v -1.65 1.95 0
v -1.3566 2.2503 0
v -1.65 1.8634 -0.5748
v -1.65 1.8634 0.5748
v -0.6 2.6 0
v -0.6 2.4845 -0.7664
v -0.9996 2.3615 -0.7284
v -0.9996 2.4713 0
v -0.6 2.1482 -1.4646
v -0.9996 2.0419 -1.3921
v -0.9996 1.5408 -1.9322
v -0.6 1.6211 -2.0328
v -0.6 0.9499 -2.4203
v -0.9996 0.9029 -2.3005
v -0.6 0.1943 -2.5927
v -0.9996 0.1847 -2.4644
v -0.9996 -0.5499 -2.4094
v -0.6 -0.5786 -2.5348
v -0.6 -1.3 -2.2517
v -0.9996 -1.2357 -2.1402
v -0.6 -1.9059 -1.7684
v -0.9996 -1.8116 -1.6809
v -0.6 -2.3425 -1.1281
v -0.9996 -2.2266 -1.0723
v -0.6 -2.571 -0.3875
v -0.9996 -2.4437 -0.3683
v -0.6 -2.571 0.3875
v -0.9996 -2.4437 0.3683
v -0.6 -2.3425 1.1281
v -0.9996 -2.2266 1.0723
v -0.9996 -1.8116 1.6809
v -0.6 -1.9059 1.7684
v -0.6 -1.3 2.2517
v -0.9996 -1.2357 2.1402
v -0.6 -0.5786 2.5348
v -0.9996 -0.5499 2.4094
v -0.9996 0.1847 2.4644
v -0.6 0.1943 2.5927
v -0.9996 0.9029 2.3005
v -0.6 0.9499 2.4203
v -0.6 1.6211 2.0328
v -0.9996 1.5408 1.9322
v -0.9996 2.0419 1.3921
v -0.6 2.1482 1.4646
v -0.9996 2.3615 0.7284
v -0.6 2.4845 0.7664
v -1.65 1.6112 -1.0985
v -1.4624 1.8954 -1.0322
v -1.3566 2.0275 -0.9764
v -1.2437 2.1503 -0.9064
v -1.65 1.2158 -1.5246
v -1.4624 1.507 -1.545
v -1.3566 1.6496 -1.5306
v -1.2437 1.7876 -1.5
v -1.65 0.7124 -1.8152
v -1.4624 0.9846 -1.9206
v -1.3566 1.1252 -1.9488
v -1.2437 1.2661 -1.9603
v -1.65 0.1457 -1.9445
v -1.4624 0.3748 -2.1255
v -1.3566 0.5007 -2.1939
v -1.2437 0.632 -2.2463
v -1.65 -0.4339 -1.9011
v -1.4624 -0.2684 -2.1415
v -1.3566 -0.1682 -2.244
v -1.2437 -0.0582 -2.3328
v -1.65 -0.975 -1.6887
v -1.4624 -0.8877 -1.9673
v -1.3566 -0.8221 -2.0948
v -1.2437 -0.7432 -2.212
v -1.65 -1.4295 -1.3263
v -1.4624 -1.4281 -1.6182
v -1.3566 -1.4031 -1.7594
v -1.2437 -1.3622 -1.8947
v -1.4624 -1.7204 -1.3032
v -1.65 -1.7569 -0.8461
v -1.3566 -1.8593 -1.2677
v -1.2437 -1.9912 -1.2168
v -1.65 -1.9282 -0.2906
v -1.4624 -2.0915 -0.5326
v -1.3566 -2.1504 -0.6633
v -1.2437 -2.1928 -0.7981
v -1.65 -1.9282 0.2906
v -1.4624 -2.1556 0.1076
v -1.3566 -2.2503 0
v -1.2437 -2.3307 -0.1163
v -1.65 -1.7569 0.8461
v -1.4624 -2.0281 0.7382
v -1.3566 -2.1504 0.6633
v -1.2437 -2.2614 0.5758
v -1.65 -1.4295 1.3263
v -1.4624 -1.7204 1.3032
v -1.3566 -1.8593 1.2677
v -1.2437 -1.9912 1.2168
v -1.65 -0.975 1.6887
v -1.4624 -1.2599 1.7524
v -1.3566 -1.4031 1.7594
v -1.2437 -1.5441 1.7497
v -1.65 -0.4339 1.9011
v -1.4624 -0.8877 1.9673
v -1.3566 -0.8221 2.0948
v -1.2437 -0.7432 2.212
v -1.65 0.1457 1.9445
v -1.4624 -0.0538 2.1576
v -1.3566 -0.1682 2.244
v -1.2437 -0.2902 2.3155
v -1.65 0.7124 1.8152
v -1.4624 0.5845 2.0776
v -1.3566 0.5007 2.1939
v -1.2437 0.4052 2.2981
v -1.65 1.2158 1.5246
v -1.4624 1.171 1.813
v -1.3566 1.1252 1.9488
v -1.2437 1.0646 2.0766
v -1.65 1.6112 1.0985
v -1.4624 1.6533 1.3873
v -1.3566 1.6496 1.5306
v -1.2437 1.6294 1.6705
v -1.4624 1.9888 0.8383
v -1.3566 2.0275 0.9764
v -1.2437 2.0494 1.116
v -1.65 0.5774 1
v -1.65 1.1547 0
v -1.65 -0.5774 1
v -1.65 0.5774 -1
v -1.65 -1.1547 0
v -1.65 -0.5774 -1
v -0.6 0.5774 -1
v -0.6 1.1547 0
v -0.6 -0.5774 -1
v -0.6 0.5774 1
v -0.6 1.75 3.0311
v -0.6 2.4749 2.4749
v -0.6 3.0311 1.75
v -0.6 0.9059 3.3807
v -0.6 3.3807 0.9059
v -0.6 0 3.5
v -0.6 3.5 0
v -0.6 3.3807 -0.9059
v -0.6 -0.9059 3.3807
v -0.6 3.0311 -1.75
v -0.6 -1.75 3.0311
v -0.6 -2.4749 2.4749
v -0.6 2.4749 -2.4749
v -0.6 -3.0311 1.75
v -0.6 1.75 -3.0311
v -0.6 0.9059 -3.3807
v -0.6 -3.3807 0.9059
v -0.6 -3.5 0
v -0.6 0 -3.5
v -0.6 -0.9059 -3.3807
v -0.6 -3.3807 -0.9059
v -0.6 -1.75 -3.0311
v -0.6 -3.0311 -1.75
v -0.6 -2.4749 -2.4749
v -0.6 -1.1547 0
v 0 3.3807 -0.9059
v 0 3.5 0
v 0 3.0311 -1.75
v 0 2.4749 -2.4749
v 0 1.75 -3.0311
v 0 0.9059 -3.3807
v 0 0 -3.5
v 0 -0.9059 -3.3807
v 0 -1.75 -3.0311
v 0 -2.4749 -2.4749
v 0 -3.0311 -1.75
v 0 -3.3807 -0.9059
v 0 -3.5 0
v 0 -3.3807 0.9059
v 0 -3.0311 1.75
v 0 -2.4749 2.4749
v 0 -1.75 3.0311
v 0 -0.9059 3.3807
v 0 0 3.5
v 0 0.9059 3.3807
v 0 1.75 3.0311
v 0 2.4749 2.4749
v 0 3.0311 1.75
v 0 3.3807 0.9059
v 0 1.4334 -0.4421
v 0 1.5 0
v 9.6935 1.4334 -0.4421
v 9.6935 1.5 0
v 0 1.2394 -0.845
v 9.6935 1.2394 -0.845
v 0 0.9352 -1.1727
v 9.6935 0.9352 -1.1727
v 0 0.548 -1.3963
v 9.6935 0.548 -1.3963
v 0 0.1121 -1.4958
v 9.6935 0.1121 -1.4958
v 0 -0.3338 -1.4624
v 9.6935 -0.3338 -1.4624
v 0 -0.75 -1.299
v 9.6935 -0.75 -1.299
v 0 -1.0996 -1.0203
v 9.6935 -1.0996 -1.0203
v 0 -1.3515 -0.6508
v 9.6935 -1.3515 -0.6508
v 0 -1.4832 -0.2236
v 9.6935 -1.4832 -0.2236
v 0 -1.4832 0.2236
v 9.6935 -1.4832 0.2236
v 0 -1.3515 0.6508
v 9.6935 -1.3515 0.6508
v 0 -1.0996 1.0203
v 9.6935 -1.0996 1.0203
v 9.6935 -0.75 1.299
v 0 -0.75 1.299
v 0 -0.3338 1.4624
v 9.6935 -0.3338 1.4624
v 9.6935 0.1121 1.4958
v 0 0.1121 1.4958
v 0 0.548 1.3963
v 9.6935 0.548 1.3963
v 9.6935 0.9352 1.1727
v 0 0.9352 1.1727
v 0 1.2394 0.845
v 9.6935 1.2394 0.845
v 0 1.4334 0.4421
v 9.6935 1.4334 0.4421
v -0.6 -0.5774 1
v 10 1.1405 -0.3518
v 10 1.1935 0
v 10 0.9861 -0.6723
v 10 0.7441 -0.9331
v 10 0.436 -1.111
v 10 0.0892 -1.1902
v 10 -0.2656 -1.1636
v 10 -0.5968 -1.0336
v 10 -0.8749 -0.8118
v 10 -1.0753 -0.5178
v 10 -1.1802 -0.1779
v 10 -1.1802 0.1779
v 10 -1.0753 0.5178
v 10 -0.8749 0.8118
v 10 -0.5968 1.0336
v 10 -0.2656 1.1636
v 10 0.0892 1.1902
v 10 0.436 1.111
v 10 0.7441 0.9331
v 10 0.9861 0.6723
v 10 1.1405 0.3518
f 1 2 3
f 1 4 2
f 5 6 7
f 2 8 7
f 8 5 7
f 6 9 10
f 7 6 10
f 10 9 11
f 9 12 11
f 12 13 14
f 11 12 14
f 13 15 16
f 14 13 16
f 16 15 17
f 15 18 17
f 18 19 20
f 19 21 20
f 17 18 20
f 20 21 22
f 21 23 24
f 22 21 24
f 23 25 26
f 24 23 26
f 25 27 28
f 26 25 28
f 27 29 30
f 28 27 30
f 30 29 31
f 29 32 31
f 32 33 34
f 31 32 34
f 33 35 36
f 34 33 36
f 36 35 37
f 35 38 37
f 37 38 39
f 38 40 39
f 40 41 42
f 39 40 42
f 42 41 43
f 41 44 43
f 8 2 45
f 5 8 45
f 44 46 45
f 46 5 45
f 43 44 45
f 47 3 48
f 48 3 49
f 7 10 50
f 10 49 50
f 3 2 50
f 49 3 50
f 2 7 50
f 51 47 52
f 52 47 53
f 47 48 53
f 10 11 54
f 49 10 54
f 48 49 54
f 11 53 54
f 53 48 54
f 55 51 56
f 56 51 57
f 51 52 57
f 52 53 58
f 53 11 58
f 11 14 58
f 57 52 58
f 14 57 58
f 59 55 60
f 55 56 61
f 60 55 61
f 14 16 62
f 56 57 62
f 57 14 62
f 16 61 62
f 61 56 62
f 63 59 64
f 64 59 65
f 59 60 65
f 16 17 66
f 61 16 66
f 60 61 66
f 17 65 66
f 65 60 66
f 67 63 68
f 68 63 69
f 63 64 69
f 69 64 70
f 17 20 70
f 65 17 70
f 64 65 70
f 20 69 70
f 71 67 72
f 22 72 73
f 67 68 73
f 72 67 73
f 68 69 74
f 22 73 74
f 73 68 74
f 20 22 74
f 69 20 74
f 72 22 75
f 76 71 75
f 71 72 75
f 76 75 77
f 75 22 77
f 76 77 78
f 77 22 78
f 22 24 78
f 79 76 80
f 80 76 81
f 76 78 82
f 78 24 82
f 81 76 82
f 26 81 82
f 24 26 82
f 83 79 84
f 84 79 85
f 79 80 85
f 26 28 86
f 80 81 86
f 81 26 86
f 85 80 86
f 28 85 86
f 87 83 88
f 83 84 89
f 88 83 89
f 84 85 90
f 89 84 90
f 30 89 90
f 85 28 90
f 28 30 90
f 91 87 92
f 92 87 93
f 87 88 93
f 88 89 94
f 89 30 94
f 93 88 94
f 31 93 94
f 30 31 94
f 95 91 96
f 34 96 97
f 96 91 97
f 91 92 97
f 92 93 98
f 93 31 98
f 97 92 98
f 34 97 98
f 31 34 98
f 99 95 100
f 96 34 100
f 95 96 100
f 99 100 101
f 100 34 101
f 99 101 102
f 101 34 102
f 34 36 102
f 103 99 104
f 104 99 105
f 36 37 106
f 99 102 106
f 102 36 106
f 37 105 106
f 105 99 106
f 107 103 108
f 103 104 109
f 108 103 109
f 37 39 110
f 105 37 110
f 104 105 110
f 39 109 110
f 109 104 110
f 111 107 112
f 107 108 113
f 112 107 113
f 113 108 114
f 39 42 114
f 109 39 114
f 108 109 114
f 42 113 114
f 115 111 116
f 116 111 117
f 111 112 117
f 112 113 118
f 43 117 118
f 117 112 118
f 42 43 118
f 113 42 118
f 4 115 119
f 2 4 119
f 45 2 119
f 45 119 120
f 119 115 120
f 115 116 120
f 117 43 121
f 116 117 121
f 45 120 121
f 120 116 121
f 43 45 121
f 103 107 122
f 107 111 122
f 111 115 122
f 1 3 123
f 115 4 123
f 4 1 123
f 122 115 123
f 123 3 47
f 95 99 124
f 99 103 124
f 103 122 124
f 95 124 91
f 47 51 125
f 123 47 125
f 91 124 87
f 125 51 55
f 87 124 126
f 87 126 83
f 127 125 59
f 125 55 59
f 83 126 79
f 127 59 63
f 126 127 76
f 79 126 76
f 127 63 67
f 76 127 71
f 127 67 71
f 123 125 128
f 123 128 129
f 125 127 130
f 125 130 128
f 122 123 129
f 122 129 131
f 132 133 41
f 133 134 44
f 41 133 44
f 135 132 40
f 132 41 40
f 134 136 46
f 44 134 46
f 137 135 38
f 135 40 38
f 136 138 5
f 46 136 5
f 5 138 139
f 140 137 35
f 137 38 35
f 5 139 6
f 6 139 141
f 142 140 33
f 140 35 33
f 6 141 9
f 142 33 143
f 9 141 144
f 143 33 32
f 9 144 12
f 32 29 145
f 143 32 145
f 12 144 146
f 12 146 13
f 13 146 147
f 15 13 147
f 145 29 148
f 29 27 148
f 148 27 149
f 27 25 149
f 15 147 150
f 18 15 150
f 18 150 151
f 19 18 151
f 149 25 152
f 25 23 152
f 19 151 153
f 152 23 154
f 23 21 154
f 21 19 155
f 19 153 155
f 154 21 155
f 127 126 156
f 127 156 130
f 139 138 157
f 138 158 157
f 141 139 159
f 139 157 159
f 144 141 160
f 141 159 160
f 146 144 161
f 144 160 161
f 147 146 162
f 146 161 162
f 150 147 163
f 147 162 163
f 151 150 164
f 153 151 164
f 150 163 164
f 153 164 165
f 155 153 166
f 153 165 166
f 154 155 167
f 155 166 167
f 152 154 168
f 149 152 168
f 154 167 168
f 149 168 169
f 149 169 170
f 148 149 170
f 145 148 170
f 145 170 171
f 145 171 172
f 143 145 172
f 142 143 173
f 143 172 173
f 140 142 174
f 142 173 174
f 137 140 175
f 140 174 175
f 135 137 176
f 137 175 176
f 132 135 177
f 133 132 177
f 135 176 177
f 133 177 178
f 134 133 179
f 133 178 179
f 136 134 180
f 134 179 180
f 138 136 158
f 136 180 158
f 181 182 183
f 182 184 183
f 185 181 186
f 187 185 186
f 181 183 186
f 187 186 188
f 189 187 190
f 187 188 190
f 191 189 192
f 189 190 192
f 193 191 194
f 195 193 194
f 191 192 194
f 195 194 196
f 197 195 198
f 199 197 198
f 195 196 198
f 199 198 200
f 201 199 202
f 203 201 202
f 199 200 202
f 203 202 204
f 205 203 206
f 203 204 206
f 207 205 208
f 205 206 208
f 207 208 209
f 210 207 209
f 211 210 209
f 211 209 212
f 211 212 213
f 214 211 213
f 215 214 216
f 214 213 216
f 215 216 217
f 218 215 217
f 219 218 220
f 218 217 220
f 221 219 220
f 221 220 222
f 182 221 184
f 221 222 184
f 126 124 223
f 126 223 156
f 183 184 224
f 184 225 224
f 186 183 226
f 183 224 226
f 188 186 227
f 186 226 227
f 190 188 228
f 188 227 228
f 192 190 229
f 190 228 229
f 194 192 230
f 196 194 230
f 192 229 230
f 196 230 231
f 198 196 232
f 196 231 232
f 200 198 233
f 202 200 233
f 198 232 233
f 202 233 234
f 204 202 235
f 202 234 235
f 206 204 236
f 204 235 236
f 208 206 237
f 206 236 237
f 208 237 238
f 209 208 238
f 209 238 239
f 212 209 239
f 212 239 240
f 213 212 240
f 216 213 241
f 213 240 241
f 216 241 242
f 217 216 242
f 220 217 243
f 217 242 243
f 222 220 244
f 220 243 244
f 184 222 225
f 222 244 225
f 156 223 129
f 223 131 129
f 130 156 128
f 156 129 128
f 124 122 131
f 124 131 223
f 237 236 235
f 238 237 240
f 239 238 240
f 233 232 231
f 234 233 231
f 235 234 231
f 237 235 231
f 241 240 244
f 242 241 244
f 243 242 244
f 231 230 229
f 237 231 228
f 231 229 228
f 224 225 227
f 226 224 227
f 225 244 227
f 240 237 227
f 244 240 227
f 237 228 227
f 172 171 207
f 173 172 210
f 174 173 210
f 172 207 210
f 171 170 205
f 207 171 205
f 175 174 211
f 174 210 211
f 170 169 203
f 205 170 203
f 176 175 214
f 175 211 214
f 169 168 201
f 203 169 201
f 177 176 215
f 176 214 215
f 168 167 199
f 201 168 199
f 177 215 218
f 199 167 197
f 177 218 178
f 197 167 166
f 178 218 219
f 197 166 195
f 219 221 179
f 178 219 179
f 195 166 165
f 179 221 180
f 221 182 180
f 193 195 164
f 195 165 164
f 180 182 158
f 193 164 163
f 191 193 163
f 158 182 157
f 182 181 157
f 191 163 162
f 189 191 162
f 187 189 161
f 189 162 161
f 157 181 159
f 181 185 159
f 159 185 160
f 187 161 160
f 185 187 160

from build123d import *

# Parameters (mm, degrees)
CUT_EXTRUDE1_DEPTH = 1.05


with BuildPart() as part:
    # Sketch1 → Revolve1 (revolve)
    with BuildSketch(Plane.XY):
        with BuildLine():
            Line((-1.65, 0), (-1.65, 1.95))
            ThreePointArc((-1.65, 1.95), (-1.184849394, 2.371679791), (-0.6, 2.6))
            Line((-0.6, 2.6), (-0.6, 3.5))
            Line((-0.6, 3.5), (0, 3.5))
            Line((0, 3.5), (0, 1.5))
            Line((0, 1.5), (9.6935, 1.5))
            Line((9.6935, 1.5), (10, 1.1935))
            Line((10, 1.1935), (10, 0))
            Line((10, 0), (-1.65, 0))
        make_face()
    revolve(axis=Axis((10, 0, 0), (-1, 0, 0)))

    # Sketch2 → Cut-Extrude1 (cut)
    with BuildSketch(Plane(origin=(-1.65, 0, 0), x_dir=(0, 0, -1), z_dir=(1, 0, 0))):
        Polygon((-1, -0.577350269), (0, -1.154700538), (1, -0.577350269), (1, 0.577350269), (0, 1.154700538), (-1, 0.577350269), align=None)
    extrude(amount=CUT_EXTRUDE1_DEPTH, mode=Mode.SUBTRACT)


solid = part.part
